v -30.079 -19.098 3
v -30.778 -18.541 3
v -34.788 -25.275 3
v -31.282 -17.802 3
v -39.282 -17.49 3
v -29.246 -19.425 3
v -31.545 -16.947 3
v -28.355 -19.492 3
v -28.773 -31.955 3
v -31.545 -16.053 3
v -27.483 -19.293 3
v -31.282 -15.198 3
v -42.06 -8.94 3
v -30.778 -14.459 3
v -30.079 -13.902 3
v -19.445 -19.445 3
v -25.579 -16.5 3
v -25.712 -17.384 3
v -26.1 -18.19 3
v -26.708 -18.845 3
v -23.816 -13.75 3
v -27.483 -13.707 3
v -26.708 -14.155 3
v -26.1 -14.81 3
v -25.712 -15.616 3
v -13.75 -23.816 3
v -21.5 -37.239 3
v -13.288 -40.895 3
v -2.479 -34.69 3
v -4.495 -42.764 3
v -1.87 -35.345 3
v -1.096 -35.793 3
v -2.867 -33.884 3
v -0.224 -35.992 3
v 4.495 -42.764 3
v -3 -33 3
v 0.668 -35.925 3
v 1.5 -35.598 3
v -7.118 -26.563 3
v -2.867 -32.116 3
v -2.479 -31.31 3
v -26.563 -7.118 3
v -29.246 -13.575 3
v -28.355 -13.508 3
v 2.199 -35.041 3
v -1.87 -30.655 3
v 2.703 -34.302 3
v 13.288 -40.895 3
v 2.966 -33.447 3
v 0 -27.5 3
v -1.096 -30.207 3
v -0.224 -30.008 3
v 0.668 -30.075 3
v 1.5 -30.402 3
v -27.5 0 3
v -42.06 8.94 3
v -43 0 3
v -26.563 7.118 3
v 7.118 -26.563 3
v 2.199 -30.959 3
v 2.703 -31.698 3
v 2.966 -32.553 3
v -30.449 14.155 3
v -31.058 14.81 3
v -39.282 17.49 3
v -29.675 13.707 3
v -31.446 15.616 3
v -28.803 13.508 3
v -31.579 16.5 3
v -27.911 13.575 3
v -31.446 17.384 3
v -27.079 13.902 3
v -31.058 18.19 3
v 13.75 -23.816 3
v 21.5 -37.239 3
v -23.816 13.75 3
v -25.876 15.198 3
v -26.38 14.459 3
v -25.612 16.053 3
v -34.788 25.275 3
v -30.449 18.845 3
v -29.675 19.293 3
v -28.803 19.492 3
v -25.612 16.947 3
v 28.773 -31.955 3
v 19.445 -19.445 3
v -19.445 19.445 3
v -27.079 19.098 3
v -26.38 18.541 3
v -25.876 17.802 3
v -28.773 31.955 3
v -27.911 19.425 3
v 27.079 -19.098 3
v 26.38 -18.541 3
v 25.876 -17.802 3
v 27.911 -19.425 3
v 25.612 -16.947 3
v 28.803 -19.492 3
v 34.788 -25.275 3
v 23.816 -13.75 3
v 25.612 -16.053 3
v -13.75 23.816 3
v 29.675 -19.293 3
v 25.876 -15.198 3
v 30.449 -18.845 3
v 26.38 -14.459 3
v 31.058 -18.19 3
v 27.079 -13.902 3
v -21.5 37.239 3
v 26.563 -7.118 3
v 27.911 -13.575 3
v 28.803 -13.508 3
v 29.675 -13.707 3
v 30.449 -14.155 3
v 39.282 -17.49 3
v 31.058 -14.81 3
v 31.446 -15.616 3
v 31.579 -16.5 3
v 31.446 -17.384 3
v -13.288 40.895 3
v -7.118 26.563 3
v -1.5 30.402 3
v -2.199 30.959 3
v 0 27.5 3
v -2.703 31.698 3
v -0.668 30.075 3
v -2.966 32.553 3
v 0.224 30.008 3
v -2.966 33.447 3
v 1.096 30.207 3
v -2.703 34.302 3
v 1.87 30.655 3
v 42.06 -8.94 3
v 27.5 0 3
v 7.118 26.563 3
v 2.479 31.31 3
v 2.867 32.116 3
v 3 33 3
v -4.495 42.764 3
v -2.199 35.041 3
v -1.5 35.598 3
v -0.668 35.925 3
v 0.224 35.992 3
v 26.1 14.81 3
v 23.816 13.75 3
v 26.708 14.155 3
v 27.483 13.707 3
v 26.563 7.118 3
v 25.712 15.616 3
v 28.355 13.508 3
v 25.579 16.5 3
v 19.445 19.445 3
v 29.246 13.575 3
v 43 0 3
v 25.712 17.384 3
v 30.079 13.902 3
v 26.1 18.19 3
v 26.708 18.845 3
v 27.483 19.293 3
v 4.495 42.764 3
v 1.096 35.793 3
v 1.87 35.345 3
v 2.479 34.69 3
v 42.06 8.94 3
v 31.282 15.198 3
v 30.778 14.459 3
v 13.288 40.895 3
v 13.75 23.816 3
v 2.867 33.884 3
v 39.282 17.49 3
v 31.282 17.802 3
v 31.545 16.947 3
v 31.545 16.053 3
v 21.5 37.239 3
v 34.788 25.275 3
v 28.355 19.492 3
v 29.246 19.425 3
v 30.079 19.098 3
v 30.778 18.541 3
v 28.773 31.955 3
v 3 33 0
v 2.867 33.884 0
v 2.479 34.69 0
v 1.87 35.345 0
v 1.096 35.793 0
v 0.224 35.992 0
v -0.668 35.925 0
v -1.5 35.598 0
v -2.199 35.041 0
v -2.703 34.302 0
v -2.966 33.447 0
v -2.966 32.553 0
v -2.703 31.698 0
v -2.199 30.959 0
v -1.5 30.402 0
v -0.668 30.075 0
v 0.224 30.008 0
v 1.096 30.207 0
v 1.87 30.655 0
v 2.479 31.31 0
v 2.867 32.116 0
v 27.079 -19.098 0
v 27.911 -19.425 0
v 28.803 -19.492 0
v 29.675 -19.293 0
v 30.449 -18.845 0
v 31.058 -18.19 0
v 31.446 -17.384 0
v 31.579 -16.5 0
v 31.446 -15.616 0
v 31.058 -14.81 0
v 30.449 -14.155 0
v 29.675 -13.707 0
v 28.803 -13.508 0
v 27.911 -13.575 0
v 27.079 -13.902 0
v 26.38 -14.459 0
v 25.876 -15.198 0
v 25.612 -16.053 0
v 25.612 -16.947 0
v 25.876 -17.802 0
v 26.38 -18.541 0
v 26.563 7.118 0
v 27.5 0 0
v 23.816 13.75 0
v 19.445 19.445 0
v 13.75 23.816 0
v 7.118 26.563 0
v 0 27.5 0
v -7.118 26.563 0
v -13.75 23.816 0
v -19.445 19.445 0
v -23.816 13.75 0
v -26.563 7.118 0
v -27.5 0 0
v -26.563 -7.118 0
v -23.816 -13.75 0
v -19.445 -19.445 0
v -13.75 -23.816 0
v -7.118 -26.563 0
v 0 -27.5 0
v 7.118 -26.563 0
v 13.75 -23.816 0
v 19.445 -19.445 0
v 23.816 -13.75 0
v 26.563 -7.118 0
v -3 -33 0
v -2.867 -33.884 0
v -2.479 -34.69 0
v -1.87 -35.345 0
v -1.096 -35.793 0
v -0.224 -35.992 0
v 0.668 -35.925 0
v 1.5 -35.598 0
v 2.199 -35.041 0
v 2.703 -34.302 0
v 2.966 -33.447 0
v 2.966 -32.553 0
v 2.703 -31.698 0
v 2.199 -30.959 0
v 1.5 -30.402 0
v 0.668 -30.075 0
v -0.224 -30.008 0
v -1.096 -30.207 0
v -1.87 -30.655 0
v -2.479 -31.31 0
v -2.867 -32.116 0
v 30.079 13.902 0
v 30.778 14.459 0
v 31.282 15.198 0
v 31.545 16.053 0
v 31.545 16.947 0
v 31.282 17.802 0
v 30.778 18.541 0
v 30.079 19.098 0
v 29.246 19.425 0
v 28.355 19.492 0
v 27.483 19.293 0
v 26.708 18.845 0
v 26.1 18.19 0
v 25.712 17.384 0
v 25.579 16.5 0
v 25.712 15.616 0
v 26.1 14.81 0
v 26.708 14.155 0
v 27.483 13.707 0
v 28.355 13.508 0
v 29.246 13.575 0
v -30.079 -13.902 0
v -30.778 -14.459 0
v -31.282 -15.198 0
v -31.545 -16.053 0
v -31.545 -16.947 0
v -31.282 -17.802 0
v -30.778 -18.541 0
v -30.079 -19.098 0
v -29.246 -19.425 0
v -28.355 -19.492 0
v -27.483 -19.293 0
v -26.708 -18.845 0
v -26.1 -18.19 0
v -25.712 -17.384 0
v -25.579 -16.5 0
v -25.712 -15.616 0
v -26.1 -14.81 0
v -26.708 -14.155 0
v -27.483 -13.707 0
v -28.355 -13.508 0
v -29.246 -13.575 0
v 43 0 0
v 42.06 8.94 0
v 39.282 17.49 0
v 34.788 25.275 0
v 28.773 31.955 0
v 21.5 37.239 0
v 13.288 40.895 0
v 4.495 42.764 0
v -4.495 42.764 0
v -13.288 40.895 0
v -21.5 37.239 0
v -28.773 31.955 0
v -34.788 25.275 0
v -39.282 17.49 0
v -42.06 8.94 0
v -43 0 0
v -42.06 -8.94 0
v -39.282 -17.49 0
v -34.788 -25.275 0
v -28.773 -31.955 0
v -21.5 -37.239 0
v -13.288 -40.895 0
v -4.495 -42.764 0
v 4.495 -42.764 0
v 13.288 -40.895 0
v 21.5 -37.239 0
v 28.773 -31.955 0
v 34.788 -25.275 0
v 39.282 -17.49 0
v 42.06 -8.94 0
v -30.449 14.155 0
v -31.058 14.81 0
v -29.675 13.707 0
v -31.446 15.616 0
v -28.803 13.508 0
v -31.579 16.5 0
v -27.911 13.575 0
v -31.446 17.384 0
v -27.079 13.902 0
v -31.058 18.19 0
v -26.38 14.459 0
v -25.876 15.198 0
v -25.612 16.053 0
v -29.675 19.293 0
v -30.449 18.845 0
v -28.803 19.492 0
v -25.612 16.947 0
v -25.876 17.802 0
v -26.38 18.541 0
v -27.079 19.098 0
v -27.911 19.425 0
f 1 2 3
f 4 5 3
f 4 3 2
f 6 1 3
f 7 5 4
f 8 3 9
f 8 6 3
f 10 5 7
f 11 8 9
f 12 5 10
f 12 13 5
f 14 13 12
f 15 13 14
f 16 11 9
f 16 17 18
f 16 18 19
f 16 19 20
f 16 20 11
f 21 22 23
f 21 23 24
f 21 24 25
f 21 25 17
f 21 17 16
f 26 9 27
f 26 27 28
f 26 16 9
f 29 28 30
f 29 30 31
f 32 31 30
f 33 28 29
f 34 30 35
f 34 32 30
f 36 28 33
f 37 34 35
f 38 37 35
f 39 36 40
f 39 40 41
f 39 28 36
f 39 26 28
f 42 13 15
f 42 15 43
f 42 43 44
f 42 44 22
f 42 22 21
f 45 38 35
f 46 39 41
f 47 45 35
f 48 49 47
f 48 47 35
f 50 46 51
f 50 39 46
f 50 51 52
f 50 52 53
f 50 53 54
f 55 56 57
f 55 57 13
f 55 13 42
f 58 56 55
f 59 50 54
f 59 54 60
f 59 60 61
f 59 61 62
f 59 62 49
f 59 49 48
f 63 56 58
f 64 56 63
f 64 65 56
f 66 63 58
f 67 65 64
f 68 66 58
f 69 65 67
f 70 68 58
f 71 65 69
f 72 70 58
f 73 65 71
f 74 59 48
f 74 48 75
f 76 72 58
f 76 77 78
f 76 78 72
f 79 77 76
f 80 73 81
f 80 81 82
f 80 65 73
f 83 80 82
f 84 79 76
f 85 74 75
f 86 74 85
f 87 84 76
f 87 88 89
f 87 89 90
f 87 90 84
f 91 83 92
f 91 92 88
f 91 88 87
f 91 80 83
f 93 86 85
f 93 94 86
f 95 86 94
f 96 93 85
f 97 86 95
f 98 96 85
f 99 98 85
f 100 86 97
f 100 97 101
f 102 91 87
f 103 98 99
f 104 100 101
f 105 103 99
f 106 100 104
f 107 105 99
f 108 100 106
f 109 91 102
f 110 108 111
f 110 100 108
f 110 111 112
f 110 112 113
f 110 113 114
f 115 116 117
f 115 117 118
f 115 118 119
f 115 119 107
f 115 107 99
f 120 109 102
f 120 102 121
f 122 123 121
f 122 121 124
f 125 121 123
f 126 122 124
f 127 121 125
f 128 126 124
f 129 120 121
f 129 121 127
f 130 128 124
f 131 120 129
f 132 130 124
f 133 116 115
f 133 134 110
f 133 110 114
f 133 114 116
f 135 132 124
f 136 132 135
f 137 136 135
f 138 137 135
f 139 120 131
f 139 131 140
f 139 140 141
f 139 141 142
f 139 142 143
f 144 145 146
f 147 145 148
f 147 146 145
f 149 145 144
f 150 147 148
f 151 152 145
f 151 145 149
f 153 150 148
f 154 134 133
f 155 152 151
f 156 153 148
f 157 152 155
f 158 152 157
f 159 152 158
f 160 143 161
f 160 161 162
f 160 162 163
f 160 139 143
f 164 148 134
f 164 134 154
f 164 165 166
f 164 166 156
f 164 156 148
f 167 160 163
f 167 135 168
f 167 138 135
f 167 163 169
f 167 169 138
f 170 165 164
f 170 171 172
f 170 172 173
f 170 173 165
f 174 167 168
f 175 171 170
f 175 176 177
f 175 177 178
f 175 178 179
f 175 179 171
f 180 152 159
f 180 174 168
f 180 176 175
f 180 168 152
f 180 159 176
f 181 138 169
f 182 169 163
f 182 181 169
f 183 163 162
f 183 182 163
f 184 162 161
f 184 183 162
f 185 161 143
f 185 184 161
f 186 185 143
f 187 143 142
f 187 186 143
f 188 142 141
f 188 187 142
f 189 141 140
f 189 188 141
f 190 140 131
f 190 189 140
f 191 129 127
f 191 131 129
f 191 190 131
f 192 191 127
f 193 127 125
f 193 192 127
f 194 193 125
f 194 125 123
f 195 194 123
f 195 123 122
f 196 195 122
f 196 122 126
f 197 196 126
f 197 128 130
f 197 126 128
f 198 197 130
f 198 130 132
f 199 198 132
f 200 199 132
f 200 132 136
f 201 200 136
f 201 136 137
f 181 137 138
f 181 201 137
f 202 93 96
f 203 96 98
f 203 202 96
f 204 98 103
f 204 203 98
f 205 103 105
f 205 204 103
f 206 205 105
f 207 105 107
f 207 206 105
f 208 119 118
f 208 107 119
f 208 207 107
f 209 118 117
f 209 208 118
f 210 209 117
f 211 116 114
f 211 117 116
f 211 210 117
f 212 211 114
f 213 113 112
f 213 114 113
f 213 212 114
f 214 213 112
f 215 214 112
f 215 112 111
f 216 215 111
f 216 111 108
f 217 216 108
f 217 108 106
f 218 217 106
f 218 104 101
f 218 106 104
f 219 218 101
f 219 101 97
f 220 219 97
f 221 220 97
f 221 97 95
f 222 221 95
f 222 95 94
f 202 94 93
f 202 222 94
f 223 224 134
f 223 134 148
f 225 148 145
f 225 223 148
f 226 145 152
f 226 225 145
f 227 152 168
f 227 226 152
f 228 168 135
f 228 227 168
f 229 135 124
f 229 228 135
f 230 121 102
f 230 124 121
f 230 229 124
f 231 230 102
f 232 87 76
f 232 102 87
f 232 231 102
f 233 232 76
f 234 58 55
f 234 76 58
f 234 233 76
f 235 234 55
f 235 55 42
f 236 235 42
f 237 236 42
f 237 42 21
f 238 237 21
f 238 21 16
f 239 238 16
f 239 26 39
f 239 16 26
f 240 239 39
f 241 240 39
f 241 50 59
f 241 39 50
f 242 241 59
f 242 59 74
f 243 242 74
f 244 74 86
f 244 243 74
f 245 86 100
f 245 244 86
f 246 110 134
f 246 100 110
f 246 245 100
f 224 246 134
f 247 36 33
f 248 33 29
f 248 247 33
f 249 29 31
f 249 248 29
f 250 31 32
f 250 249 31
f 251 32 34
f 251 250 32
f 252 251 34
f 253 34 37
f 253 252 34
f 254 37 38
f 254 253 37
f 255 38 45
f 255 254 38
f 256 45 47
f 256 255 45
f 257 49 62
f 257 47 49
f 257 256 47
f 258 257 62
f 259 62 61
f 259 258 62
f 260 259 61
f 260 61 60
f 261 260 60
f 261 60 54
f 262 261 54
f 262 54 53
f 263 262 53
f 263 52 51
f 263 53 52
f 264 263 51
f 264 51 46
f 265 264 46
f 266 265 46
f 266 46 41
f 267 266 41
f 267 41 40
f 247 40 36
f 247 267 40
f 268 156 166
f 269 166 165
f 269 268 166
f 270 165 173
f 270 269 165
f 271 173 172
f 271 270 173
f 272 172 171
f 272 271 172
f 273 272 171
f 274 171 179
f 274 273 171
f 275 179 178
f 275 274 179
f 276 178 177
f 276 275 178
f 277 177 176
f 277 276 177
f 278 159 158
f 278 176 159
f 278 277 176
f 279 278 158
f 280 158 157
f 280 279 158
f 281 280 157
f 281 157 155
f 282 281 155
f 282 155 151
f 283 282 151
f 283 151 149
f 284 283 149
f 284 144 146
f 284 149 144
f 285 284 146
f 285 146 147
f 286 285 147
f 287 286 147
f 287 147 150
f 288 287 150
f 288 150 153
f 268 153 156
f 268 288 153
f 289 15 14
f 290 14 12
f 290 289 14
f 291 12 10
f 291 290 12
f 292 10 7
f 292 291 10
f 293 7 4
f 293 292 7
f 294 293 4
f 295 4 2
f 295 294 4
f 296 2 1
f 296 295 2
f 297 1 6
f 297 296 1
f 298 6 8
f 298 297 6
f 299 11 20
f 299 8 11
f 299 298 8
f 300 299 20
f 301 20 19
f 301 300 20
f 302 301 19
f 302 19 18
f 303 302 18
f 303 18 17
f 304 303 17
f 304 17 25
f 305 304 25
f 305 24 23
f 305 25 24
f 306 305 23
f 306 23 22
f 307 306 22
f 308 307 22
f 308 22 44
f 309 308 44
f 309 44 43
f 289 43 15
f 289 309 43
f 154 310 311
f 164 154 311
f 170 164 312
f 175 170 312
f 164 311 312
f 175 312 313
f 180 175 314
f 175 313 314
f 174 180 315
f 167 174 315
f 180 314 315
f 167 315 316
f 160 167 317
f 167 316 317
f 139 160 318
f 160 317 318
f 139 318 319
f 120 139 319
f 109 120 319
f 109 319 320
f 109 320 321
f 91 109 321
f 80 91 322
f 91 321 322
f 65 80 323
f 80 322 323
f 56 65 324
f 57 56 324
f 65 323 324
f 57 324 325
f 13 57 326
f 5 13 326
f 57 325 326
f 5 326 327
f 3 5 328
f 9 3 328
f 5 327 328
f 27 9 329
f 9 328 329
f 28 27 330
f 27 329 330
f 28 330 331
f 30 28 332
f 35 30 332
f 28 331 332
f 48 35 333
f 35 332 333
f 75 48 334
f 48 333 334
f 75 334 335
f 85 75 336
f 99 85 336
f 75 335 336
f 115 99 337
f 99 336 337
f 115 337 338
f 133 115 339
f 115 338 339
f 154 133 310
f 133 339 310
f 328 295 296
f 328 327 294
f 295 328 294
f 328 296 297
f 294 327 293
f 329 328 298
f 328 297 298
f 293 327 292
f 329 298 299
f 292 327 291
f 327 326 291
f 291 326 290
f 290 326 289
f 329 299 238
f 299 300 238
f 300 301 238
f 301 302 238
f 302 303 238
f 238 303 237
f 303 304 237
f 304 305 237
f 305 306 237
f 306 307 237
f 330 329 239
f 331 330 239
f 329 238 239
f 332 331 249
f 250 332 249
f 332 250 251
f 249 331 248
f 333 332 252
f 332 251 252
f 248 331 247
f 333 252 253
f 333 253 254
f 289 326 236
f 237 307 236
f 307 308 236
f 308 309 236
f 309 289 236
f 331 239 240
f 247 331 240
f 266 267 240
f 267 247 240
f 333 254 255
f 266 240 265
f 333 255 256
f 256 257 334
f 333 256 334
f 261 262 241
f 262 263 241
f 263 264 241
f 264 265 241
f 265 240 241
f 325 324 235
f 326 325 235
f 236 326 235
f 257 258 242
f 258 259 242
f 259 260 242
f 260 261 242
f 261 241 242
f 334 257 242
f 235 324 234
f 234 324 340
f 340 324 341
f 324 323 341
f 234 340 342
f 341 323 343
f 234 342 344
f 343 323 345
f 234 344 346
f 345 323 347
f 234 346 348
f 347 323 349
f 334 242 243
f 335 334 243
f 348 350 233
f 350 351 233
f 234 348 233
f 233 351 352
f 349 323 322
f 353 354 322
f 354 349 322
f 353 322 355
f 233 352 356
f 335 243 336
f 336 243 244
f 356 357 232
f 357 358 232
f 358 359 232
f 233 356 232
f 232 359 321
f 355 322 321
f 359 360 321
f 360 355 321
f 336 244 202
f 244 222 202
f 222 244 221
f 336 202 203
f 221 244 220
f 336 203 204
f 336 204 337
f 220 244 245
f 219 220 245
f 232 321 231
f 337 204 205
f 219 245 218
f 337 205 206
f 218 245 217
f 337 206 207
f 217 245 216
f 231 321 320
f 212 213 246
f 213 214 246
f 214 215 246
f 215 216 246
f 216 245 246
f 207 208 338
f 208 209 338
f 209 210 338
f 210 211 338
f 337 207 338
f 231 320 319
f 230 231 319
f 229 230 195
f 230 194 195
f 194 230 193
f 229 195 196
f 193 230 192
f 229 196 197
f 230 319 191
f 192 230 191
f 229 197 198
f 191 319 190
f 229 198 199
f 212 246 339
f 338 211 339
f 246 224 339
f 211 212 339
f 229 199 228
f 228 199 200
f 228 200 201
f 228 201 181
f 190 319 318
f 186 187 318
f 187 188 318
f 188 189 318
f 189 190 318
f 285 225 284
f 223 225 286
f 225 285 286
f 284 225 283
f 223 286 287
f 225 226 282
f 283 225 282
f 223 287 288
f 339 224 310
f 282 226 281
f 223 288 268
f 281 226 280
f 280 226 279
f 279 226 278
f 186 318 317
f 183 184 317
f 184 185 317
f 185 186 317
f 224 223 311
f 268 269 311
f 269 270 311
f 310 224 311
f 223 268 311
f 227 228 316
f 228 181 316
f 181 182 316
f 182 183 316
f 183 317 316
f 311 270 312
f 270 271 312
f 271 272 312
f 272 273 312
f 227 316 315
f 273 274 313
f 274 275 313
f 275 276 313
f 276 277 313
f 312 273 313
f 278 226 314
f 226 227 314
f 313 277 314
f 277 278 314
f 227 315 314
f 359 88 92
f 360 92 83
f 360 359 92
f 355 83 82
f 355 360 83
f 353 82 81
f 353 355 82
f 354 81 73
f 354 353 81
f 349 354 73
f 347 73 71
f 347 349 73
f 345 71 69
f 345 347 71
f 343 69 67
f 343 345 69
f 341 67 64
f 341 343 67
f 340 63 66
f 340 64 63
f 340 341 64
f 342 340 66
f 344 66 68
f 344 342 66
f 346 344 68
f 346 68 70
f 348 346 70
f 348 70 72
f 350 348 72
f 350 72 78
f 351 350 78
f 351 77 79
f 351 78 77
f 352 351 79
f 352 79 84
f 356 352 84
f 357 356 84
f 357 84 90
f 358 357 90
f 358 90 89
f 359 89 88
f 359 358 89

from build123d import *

# Parameters (mm, degrees)
SKETCH1_R           = 43
BOSS_EXTRUDE2_DEPTH = 3
SKETCH1_3_R         = 3
CUT_EXTRUDE1_DEPTH  = 61.88513776
CIRPATTERN2_COUNT   = 6
SKETCH1_4_R         = 27.5
CUT_EXTRUDE2_DEPTH  = 61.88513776


with BuildPart() as part:
    # Sketch1 → Boss-Extrude2 (new body)
    with BuildSketch(Plane.XY):
        Circle(SKETCH1_R)
    extrude(amount=BOSS_EXTRUDE2_DEPTH)

    # Sketch1<3> → Cut-Extrude1 (cut, through all)
    with BuildSketch(Plane.XY):
        with Locations((0, 33)):
            Circle(SKETCH1_3_R)
    cut_extrude1 = extrude(amount=CUT_EXTRUDE1_DEPTH, mode=Mode.SUBTRACT)

    # CirPattern2: Cut-Extrude1 ×6 about axis
    cirpattern2_axis = Axis((0, 0, 3), (0, 0, -1))
    for i in range(1, CIRPATTERN2_COUNT):
        add(cut_extrude1.rotate(cirpattern2_axis, i * 360 / CIRPATTERN2_COUNT), mode=Mode.SUBTRACT)

    # Sketch1<4> → Cut-Extrude2 (cut, through all)
    with BuildSketch(Plane.XY):
        Circle(SKETCH1_4_R)
    extrude(amount=CUT_EXTRUDE2_DEPTH, mode=Mode.SUBTRACT)


solid = part.part
